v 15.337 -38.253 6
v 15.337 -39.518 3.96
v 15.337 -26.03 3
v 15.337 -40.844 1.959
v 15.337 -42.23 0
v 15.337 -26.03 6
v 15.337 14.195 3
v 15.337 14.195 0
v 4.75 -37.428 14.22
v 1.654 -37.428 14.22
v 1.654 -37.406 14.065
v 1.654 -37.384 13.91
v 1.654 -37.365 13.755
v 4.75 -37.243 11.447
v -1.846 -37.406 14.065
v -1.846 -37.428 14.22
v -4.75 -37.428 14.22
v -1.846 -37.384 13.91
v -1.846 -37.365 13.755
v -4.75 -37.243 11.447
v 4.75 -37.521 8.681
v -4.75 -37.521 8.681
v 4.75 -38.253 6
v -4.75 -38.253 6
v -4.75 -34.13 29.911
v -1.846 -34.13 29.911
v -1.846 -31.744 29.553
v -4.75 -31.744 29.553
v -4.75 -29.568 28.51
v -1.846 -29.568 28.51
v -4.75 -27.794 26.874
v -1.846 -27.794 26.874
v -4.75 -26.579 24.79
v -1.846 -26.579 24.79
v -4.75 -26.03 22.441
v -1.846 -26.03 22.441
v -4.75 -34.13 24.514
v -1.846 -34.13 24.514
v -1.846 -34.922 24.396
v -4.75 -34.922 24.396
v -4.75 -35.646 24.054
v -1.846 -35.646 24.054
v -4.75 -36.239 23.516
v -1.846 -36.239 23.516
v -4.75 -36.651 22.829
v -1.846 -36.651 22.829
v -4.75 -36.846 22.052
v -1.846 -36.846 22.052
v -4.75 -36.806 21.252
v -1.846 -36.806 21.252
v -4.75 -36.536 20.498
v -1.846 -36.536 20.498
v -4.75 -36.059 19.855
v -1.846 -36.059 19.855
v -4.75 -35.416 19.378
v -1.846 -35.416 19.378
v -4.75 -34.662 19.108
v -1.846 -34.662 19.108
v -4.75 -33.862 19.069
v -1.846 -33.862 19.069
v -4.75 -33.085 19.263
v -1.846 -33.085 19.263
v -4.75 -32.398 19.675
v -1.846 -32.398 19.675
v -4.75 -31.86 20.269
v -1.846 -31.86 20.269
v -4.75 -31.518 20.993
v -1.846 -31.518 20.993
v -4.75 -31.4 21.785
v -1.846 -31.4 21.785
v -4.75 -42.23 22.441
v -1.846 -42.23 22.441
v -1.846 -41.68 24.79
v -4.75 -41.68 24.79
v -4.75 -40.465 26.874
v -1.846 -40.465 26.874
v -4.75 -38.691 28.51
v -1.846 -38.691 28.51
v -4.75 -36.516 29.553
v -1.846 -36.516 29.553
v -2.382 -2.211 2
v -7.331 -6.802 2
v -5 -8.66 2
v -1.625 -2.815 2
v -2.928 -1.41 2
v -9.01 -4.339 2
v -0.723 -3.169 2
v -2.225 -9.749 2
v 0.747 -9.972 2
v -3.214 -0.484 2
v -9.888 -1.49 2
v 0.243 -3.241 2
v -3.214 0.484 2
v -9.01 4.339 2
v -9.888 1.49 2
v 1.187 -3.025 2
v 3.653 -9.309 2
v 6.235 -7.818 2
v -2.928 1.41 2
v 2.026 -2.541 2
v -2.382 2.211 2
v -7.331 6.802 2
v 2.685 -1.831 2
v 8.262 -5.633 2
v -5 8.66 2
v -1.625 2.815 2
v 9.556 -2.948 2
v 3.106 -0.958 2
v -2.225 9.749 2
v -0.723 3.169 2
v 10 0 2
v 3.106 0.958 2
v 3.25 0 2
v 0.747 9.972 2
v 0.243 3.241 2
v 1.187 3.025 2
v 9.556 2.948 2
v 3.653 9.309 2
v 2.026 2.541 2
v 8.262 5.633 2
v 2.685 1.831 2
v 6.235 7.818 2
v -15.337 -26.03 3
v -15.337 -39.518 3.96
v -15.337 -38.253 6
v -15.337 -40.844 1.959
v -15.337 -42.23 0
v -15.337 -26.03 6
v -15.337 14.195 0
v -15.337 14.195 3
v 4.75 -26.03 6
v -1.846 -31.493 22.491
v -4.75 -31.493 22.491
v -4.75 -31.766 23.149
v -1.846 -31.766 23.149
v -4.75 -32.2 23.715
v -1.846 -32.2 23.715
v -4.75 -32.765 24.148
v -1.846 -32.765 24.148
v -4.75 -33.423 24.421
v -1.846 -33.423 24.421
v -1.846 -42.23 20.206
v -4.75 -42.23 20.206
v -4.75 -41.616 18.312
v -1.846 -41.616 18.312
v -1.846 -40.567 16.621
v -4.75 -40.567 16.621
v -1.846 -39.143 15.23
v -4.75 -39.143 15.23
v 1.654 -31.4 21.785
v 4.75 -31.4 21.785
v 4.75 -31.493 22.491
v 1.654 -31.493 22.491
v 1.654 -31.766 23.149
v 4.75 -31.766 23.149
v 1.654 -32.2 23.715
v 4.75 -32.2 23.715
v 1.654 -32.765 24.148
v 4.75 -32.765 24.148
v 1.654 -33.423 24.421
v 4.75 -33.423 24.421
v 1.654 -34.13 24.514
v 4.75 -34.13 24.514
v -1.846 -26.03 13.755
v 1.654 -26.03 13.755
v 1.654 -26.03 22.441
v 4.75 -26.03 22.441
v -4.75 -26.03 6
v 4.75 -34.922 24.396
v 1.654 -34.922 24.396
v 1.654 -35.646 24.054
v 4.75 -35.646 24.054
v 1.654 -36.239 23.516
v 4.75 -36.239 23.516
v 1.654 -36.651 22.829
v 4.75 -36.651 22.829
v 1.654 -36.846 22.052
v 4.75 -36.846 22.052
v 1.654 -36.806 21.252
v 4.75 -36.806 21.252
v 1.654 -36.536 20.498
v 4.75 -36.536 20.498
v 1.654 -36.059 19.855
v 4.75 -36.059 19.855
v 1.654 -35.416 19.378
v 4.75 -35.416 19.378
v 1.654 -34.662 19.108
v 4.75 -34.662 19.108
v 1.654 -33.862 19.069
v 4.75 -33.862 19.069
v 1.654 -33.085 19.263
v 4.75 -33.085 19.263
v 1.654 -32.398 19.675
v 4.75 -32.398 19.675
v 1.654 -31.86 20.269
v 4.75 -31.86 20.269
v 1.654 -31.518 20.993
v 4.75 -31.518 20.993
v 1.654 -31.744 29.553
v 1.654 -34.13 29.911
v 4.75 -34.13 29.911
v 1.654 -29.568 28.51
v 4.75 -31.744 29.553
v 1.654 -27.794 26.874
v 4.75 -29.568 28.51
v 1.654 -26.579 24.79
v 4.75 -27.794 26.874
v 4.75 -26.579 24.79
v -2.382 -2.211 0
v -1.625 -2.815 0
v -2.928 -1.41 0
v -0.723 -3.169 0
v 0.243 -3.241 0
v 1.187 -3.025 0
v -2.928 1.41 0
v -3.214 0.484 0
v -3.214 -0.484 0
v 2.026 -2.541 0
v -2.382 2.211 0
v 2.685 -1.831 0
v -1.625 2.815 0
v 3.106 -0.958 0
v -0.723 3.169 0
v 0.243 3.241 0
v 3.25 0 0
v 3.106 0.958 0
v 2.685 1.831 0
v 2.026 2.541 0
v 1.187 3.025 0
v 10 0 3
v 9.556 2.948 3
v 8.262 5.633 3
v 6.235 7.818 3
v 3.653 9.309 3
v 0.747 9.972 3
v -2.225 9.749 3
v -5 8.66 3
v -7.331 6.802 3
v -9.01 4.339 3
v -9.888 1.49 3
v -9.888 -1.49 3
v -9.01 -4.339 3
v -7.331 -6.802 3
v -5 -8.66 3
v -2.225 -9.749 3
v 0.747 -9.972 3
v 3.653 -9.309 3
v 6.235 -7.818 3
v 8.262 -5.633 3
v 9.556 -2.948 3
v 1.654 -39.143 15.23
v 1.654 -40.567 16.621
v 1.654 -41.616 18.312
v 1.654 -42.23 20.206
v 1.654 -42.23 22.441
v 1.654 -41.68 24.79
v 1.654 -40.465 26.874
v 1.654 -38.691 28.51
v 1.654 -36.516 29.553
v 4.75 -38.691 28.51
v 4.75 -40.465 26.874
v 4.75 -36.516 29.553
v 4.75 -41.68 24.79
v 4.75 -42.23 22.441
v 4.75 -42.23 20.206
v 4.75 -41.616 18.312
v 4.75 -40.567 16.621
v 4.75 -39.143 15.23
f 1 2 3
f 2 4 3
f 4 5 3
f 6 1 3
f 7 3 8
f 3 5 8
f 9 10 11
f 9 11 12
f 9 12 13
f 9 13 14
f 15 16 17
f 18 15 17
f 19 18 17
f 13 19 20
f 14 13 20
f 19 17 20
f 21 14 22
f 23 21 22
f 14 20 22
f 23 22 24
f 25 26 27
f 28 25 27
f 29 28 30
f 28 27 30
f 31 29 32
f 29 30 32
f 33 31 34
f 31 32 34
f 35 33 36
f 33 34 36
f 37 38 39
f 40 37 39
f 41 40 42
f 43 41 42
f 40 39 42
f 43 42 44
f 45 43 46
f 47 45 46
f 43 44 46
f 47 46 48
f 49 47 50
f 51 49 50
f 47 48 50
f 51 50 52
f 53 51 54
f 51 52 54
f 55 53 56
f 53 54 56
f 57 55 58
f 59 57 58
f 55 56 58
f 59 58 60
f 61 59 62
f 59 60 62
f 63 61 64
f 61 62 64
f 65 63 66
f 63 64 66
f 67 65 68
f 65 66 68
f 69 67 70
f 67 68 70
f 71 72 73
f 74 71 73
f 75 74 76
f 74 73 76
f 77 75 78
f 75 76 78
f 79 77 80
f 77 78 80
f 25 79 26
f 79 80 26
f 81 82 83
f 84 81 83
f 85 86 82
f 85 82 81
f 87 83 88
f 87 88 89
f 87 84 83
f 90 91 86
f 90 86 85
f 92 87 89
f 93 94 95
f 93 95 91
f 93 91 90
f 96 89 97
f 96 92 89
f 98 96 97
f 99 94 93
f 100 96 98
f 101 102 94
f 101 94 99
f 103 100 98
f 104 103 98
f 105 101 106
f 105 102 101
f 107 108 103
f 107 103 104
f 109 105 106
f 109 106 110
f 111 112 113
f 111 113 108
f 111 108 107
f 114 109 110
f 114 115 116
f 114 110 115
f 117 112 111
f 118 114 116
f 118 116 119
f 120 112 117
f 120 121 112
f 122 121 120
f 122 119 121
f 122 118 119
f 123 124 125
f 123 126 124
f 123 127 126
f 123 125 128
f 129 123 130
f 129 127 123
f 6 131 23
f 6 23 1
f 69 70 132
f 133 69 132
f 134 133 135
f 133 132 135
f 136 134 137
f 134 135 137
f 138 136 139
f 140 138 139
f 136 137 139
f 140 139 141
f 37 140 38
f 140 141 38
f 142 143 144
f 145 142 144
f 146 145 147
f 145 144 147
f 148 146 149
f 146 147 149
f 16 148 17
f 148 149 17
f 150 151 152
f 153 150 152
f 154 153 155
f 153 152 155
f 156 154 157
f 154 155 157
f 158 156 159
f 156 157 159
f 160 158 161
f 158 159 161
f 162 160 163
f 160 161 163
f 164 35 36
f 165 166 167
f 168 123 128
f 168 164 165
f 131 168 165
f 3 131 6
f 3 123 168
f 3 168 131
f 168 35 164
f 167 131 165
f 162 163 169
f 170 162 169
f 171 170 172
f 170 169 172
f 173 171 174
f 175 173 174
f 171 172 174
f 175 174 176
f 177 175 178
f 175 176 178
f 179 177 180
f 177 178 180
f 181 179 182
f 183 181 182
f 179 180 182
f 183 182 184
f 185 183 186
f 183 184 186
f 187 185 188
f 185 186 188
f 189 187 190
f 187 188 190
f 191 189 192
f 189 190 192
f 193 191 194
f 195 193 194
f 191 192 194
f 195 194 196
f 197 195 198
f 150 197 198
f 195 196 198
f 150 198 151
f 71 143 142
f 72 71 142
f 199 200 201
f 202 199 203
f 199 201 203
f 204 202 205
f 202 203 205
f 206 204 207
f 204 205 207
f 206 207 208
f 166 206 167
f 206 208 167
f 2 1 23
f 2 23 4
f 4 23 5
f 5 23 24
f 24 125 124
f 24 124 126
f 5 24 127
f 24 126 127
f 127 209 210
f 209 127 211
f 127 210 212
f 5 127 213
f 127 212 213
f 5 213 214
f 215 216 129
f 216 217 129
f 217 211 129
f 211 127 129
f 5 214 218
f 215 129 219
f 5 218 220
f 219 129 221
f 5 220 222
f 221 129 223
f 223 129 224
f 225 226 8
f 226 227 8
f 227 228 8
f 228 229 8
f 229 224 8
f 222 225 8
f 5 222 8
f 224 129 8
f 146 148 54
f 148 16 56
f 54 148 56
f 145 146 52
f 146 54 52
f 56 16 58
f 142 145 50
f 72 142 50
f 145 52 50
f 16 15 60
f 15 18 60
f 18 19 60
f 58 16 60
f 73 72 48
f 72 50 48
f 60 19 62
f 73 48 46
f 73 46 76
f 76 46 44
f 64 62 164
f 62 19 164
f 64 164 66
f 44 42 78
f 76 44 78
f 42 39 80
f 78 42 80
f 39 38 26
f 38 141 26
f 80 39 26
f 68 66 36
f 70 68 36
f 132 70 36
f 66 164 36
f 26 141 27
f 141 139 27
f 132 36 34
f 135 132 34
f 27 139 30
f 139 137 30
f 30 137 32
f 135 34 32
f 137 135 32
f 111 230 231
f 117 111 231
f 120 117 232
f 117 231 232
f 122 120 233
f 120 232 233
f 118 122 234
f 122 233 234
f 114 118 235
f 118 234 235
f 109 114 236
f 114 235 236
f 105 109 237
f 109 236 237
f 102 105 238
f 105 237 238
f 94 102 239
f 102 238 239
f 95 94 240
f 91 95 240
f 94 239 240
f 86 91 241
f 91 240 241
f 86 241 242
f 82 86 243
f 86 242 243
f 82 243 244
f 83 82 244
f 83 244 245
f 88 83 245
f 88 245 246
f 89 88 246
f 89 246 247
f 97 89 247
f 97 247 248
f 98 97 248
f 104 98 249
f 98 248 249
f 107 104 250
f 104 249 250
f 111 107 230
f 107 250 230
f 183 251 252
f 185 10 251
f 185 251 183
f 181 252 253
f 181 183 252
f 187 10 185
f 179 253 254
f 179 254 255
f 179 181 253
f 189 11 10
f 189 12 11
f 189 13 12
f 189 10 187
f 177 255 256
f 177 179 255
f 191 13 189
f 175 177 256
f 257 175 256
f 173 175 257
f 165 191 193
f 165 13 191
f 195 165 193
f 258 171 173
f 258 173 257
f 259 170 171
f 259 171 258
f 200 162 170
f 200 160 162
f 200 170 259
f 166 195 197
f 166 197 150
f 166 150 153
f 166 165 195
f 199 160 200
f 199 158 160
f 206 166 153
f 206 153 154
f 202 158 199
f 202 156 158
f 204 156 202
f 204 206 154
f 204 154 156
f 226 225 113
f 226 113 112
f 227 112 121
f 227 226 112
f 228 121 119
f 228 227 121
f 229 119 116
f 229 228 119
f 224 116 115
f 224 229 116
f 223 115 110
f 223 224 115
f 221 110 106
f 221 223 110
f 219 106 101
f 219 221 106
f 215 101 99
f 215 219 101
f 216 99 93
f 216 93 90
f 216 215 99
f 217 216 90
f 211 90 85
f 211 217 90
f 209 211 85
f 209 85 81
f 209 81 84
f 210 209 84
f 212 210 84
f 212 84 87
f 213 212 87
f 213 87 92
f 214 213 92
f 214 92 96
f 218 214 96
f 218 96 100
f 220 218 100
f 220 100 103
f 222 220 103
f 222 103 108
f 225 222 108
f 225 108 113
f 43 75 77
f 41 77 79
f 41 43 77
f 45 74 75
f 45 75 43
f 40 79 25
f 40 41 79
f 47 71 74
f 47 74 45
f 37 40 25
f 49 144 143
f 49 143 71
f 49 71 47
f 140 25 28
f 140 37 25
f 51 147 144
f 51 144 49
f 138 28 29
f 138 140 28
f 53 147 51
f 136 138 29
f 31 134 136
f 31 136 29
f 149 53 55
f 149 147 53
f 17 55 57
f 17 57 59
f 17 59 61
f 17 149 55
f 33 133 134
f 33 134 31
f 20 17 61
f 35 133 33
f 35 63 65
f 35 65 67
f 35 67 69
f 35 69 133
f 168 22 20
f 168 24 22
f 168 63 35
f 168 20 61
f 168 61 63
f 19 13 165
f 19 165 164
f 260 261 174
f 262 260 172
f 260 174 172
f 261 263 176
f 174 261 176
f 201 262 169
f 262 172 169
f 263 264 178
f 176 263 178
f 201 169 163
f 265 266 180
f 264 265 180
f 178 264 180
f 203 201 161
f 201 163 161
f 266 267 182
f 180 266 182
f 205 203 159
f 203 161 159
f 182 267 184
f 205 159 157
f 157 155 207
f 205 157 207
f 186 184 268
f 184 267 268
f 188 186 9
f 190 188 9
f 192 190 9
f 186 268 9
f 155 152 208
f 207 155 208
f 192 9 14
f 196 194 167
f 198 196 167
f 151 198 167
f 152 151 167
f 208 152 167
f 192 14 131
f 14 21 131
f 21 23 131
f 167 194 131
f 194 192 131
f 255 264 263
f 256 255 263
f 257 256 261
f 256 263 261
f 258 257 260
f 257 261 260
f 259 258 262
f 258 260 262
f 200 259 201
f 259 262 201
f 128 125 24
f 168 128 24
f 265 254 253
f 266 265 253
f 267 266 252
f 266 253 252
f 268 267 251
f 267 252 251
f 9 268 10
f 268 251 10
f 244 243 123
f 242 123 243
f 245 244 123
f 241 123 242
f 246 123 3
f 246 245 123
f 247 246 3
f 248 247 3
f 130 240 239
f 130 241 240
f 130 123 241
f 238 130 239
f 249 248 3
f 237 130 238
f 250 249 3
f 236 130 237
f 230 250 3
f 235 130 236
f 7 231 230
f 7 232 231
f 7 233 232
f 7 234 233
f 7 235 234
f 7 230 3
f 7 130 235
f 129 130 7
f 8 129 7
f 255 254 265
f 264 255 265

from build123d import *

# Parameters (mm, degrees)
F0_W      = 30.6736361235
F0_H      = 84.459155798
F0_R      = 3.25
F1_DEPTH  = 3
F2_W      = 30.6736361235
F2_H      = 16.2
F3_DEPTH  = 3
F4_W      = 9.5
F4_H      = 16.2
F5_DEPTH  = 24
F6_W      = 3.5
F6_H      = 16.2452395454
F7_DEPTH  = 18
F9_DEPTH  = 10
F10_R     = 10
F10_R_2   = 3.25
F11_DEPTH = 1
F12_W     = 30.6736361235
F12_H     = 28.0341655016
F13_DEPTH = 5
F15_DEPTH = 30.6746361235


# Not quite as in the source:
# - a feature names something its author has since deleted; it is built from what else it names


with BuildPart() as f1:
    # F0 (on Top) → F1 (new body)
    with BuildSketch(Plane.XY):
        Rectangle(F0_W, F0_H)
        Circle(F0_R, mode=Mode.SUBTRACT)
    extrude(amount=F1_DEPTH)

    # F2 (on face) → F3 (join)
    with BuildSketch(Plane.XY.offset(3)):
        with Locations((0, -34.129577899)):
            Rectangle(F2_W, F2_H)
    extrude(amount=F3_DEPTH)

    # F4 (on face) → F5 (join)
    with BuildSketch(Plane.XY.offset(6)):
        with Locations((0, -34.129577899)):
            Rectangle(F4_W, F4_H)
    extrude(amount=F5_DEPTH)

    # F6 (on face) → F7 (cut)
    with BuildSketch(Plane(origin=(0, -26.029577899, 0), x_dir=(-1, 0, 0), z_dir=(0, 1, 0))):
        with Locations((0.0963514363, 21.8773802273)):
            Rectangle(F6_W, F6_H)
    extrude(amount=-F7_DEPTH, mode=Mode.SUBTRACT)

    # F8 (on face) → F9 (cut)
    with BuildSketch(Plane.YZ.offset(4.75)):
        with BuildLine():
            Line((-26.029577899, 30), (-34.129577899, 30))
            Line((-34.129577899, 30), (-34.129577899, 29.9113391646))
            ThreePointArc((-34.129577899, 29.9113391646), (-28.6200020152, 27.7584969737), (-26.029577899, 22.440615928))
            Line((-26.029577899, 22.440615928), (-26.029577899, 30))
        make_face()
        with BuildLine():
            Line((-34.129577899, 29.9113391646), (-34.129577899, 30))
            Line((-34.129577899, 30), (-42.229577899, 30))
            Line((-42.229577899, 30), (-42.229577899, 22.440615928))
            ThreePointArc((-42.229577899, 22.440615928), (-39.6391537828, 27.7584969737), (-34.129577899, 29.9113391646))
        make_face()
        with BuildLine():
            ThreePointArc((-31.4004653301, 21.7848364264), (-32.1998038949, 23.7146104305), (-34.129577899, 24.5139489953))
            ThreePointArc((-34.129577899, 24.5139489953), (-36.0593519031, 19.8550624223), (-31.4004653301, 21.7848364264))
        make_face()
    extrude(amount=-F9_DEPTH, mode=Mode.SUBTRACT)

    # F10 (on face) → F11 (cut)
    with BuildSketch(Plane.XY.offset(3)):
        Circle(F10_R)
        Circle(F10_R_2, mode=Mode.SUBTRACT)
    extrude(amount=-F11_DEPTH, mode=Mode.SUBTRACT)

    # F12 (on face) → F13 (cut)
    with BuildSketch(Plane.XY.offset(3)):
        with Locations((0, 28.2124951482)):
            Rectangle(F12_W, F12_H)
    extrude(amount=-F13_DEPTH, mode=Mode.SUBTRACT)

    # F14 (on face) → F15 (cut, through all)
    with BuildSketch(Plane(origin=(-15.3368180618, 0, 0), x_dir=(0, -1, 0), z_dir=(-1, 0, 0))):
        with BuildLine():
            Line((38.2532812655, 6), (42.229577899, 6))
            Line((42.229577899, 6), (42.229577899, 20.2058496963))
            ThreePointArc((42.229577899, 20.2058496963), (40.5668907772, 16.6210972771), (37.4282303868, 14.220307964))
            ThreePointArc((37.4282303868, 14.220307964), (37.3242335364, 10.0583119864), (38.2532812655, 6))
        make_face()
        with BuildLine():
            Line((42.229577899, 0), (42.229577899, 6))
            Line((42.229577899, 6), (38.2532812655, 6))
            ThreePointArc((38.2532812655, 6), (40.1731353083, 2.9547402847), (42.229577899, 0))
        make_face()
    extrude(amount=-F15_DEPTH, mode=Mode.SUBTRACT)


solid = f1.part
